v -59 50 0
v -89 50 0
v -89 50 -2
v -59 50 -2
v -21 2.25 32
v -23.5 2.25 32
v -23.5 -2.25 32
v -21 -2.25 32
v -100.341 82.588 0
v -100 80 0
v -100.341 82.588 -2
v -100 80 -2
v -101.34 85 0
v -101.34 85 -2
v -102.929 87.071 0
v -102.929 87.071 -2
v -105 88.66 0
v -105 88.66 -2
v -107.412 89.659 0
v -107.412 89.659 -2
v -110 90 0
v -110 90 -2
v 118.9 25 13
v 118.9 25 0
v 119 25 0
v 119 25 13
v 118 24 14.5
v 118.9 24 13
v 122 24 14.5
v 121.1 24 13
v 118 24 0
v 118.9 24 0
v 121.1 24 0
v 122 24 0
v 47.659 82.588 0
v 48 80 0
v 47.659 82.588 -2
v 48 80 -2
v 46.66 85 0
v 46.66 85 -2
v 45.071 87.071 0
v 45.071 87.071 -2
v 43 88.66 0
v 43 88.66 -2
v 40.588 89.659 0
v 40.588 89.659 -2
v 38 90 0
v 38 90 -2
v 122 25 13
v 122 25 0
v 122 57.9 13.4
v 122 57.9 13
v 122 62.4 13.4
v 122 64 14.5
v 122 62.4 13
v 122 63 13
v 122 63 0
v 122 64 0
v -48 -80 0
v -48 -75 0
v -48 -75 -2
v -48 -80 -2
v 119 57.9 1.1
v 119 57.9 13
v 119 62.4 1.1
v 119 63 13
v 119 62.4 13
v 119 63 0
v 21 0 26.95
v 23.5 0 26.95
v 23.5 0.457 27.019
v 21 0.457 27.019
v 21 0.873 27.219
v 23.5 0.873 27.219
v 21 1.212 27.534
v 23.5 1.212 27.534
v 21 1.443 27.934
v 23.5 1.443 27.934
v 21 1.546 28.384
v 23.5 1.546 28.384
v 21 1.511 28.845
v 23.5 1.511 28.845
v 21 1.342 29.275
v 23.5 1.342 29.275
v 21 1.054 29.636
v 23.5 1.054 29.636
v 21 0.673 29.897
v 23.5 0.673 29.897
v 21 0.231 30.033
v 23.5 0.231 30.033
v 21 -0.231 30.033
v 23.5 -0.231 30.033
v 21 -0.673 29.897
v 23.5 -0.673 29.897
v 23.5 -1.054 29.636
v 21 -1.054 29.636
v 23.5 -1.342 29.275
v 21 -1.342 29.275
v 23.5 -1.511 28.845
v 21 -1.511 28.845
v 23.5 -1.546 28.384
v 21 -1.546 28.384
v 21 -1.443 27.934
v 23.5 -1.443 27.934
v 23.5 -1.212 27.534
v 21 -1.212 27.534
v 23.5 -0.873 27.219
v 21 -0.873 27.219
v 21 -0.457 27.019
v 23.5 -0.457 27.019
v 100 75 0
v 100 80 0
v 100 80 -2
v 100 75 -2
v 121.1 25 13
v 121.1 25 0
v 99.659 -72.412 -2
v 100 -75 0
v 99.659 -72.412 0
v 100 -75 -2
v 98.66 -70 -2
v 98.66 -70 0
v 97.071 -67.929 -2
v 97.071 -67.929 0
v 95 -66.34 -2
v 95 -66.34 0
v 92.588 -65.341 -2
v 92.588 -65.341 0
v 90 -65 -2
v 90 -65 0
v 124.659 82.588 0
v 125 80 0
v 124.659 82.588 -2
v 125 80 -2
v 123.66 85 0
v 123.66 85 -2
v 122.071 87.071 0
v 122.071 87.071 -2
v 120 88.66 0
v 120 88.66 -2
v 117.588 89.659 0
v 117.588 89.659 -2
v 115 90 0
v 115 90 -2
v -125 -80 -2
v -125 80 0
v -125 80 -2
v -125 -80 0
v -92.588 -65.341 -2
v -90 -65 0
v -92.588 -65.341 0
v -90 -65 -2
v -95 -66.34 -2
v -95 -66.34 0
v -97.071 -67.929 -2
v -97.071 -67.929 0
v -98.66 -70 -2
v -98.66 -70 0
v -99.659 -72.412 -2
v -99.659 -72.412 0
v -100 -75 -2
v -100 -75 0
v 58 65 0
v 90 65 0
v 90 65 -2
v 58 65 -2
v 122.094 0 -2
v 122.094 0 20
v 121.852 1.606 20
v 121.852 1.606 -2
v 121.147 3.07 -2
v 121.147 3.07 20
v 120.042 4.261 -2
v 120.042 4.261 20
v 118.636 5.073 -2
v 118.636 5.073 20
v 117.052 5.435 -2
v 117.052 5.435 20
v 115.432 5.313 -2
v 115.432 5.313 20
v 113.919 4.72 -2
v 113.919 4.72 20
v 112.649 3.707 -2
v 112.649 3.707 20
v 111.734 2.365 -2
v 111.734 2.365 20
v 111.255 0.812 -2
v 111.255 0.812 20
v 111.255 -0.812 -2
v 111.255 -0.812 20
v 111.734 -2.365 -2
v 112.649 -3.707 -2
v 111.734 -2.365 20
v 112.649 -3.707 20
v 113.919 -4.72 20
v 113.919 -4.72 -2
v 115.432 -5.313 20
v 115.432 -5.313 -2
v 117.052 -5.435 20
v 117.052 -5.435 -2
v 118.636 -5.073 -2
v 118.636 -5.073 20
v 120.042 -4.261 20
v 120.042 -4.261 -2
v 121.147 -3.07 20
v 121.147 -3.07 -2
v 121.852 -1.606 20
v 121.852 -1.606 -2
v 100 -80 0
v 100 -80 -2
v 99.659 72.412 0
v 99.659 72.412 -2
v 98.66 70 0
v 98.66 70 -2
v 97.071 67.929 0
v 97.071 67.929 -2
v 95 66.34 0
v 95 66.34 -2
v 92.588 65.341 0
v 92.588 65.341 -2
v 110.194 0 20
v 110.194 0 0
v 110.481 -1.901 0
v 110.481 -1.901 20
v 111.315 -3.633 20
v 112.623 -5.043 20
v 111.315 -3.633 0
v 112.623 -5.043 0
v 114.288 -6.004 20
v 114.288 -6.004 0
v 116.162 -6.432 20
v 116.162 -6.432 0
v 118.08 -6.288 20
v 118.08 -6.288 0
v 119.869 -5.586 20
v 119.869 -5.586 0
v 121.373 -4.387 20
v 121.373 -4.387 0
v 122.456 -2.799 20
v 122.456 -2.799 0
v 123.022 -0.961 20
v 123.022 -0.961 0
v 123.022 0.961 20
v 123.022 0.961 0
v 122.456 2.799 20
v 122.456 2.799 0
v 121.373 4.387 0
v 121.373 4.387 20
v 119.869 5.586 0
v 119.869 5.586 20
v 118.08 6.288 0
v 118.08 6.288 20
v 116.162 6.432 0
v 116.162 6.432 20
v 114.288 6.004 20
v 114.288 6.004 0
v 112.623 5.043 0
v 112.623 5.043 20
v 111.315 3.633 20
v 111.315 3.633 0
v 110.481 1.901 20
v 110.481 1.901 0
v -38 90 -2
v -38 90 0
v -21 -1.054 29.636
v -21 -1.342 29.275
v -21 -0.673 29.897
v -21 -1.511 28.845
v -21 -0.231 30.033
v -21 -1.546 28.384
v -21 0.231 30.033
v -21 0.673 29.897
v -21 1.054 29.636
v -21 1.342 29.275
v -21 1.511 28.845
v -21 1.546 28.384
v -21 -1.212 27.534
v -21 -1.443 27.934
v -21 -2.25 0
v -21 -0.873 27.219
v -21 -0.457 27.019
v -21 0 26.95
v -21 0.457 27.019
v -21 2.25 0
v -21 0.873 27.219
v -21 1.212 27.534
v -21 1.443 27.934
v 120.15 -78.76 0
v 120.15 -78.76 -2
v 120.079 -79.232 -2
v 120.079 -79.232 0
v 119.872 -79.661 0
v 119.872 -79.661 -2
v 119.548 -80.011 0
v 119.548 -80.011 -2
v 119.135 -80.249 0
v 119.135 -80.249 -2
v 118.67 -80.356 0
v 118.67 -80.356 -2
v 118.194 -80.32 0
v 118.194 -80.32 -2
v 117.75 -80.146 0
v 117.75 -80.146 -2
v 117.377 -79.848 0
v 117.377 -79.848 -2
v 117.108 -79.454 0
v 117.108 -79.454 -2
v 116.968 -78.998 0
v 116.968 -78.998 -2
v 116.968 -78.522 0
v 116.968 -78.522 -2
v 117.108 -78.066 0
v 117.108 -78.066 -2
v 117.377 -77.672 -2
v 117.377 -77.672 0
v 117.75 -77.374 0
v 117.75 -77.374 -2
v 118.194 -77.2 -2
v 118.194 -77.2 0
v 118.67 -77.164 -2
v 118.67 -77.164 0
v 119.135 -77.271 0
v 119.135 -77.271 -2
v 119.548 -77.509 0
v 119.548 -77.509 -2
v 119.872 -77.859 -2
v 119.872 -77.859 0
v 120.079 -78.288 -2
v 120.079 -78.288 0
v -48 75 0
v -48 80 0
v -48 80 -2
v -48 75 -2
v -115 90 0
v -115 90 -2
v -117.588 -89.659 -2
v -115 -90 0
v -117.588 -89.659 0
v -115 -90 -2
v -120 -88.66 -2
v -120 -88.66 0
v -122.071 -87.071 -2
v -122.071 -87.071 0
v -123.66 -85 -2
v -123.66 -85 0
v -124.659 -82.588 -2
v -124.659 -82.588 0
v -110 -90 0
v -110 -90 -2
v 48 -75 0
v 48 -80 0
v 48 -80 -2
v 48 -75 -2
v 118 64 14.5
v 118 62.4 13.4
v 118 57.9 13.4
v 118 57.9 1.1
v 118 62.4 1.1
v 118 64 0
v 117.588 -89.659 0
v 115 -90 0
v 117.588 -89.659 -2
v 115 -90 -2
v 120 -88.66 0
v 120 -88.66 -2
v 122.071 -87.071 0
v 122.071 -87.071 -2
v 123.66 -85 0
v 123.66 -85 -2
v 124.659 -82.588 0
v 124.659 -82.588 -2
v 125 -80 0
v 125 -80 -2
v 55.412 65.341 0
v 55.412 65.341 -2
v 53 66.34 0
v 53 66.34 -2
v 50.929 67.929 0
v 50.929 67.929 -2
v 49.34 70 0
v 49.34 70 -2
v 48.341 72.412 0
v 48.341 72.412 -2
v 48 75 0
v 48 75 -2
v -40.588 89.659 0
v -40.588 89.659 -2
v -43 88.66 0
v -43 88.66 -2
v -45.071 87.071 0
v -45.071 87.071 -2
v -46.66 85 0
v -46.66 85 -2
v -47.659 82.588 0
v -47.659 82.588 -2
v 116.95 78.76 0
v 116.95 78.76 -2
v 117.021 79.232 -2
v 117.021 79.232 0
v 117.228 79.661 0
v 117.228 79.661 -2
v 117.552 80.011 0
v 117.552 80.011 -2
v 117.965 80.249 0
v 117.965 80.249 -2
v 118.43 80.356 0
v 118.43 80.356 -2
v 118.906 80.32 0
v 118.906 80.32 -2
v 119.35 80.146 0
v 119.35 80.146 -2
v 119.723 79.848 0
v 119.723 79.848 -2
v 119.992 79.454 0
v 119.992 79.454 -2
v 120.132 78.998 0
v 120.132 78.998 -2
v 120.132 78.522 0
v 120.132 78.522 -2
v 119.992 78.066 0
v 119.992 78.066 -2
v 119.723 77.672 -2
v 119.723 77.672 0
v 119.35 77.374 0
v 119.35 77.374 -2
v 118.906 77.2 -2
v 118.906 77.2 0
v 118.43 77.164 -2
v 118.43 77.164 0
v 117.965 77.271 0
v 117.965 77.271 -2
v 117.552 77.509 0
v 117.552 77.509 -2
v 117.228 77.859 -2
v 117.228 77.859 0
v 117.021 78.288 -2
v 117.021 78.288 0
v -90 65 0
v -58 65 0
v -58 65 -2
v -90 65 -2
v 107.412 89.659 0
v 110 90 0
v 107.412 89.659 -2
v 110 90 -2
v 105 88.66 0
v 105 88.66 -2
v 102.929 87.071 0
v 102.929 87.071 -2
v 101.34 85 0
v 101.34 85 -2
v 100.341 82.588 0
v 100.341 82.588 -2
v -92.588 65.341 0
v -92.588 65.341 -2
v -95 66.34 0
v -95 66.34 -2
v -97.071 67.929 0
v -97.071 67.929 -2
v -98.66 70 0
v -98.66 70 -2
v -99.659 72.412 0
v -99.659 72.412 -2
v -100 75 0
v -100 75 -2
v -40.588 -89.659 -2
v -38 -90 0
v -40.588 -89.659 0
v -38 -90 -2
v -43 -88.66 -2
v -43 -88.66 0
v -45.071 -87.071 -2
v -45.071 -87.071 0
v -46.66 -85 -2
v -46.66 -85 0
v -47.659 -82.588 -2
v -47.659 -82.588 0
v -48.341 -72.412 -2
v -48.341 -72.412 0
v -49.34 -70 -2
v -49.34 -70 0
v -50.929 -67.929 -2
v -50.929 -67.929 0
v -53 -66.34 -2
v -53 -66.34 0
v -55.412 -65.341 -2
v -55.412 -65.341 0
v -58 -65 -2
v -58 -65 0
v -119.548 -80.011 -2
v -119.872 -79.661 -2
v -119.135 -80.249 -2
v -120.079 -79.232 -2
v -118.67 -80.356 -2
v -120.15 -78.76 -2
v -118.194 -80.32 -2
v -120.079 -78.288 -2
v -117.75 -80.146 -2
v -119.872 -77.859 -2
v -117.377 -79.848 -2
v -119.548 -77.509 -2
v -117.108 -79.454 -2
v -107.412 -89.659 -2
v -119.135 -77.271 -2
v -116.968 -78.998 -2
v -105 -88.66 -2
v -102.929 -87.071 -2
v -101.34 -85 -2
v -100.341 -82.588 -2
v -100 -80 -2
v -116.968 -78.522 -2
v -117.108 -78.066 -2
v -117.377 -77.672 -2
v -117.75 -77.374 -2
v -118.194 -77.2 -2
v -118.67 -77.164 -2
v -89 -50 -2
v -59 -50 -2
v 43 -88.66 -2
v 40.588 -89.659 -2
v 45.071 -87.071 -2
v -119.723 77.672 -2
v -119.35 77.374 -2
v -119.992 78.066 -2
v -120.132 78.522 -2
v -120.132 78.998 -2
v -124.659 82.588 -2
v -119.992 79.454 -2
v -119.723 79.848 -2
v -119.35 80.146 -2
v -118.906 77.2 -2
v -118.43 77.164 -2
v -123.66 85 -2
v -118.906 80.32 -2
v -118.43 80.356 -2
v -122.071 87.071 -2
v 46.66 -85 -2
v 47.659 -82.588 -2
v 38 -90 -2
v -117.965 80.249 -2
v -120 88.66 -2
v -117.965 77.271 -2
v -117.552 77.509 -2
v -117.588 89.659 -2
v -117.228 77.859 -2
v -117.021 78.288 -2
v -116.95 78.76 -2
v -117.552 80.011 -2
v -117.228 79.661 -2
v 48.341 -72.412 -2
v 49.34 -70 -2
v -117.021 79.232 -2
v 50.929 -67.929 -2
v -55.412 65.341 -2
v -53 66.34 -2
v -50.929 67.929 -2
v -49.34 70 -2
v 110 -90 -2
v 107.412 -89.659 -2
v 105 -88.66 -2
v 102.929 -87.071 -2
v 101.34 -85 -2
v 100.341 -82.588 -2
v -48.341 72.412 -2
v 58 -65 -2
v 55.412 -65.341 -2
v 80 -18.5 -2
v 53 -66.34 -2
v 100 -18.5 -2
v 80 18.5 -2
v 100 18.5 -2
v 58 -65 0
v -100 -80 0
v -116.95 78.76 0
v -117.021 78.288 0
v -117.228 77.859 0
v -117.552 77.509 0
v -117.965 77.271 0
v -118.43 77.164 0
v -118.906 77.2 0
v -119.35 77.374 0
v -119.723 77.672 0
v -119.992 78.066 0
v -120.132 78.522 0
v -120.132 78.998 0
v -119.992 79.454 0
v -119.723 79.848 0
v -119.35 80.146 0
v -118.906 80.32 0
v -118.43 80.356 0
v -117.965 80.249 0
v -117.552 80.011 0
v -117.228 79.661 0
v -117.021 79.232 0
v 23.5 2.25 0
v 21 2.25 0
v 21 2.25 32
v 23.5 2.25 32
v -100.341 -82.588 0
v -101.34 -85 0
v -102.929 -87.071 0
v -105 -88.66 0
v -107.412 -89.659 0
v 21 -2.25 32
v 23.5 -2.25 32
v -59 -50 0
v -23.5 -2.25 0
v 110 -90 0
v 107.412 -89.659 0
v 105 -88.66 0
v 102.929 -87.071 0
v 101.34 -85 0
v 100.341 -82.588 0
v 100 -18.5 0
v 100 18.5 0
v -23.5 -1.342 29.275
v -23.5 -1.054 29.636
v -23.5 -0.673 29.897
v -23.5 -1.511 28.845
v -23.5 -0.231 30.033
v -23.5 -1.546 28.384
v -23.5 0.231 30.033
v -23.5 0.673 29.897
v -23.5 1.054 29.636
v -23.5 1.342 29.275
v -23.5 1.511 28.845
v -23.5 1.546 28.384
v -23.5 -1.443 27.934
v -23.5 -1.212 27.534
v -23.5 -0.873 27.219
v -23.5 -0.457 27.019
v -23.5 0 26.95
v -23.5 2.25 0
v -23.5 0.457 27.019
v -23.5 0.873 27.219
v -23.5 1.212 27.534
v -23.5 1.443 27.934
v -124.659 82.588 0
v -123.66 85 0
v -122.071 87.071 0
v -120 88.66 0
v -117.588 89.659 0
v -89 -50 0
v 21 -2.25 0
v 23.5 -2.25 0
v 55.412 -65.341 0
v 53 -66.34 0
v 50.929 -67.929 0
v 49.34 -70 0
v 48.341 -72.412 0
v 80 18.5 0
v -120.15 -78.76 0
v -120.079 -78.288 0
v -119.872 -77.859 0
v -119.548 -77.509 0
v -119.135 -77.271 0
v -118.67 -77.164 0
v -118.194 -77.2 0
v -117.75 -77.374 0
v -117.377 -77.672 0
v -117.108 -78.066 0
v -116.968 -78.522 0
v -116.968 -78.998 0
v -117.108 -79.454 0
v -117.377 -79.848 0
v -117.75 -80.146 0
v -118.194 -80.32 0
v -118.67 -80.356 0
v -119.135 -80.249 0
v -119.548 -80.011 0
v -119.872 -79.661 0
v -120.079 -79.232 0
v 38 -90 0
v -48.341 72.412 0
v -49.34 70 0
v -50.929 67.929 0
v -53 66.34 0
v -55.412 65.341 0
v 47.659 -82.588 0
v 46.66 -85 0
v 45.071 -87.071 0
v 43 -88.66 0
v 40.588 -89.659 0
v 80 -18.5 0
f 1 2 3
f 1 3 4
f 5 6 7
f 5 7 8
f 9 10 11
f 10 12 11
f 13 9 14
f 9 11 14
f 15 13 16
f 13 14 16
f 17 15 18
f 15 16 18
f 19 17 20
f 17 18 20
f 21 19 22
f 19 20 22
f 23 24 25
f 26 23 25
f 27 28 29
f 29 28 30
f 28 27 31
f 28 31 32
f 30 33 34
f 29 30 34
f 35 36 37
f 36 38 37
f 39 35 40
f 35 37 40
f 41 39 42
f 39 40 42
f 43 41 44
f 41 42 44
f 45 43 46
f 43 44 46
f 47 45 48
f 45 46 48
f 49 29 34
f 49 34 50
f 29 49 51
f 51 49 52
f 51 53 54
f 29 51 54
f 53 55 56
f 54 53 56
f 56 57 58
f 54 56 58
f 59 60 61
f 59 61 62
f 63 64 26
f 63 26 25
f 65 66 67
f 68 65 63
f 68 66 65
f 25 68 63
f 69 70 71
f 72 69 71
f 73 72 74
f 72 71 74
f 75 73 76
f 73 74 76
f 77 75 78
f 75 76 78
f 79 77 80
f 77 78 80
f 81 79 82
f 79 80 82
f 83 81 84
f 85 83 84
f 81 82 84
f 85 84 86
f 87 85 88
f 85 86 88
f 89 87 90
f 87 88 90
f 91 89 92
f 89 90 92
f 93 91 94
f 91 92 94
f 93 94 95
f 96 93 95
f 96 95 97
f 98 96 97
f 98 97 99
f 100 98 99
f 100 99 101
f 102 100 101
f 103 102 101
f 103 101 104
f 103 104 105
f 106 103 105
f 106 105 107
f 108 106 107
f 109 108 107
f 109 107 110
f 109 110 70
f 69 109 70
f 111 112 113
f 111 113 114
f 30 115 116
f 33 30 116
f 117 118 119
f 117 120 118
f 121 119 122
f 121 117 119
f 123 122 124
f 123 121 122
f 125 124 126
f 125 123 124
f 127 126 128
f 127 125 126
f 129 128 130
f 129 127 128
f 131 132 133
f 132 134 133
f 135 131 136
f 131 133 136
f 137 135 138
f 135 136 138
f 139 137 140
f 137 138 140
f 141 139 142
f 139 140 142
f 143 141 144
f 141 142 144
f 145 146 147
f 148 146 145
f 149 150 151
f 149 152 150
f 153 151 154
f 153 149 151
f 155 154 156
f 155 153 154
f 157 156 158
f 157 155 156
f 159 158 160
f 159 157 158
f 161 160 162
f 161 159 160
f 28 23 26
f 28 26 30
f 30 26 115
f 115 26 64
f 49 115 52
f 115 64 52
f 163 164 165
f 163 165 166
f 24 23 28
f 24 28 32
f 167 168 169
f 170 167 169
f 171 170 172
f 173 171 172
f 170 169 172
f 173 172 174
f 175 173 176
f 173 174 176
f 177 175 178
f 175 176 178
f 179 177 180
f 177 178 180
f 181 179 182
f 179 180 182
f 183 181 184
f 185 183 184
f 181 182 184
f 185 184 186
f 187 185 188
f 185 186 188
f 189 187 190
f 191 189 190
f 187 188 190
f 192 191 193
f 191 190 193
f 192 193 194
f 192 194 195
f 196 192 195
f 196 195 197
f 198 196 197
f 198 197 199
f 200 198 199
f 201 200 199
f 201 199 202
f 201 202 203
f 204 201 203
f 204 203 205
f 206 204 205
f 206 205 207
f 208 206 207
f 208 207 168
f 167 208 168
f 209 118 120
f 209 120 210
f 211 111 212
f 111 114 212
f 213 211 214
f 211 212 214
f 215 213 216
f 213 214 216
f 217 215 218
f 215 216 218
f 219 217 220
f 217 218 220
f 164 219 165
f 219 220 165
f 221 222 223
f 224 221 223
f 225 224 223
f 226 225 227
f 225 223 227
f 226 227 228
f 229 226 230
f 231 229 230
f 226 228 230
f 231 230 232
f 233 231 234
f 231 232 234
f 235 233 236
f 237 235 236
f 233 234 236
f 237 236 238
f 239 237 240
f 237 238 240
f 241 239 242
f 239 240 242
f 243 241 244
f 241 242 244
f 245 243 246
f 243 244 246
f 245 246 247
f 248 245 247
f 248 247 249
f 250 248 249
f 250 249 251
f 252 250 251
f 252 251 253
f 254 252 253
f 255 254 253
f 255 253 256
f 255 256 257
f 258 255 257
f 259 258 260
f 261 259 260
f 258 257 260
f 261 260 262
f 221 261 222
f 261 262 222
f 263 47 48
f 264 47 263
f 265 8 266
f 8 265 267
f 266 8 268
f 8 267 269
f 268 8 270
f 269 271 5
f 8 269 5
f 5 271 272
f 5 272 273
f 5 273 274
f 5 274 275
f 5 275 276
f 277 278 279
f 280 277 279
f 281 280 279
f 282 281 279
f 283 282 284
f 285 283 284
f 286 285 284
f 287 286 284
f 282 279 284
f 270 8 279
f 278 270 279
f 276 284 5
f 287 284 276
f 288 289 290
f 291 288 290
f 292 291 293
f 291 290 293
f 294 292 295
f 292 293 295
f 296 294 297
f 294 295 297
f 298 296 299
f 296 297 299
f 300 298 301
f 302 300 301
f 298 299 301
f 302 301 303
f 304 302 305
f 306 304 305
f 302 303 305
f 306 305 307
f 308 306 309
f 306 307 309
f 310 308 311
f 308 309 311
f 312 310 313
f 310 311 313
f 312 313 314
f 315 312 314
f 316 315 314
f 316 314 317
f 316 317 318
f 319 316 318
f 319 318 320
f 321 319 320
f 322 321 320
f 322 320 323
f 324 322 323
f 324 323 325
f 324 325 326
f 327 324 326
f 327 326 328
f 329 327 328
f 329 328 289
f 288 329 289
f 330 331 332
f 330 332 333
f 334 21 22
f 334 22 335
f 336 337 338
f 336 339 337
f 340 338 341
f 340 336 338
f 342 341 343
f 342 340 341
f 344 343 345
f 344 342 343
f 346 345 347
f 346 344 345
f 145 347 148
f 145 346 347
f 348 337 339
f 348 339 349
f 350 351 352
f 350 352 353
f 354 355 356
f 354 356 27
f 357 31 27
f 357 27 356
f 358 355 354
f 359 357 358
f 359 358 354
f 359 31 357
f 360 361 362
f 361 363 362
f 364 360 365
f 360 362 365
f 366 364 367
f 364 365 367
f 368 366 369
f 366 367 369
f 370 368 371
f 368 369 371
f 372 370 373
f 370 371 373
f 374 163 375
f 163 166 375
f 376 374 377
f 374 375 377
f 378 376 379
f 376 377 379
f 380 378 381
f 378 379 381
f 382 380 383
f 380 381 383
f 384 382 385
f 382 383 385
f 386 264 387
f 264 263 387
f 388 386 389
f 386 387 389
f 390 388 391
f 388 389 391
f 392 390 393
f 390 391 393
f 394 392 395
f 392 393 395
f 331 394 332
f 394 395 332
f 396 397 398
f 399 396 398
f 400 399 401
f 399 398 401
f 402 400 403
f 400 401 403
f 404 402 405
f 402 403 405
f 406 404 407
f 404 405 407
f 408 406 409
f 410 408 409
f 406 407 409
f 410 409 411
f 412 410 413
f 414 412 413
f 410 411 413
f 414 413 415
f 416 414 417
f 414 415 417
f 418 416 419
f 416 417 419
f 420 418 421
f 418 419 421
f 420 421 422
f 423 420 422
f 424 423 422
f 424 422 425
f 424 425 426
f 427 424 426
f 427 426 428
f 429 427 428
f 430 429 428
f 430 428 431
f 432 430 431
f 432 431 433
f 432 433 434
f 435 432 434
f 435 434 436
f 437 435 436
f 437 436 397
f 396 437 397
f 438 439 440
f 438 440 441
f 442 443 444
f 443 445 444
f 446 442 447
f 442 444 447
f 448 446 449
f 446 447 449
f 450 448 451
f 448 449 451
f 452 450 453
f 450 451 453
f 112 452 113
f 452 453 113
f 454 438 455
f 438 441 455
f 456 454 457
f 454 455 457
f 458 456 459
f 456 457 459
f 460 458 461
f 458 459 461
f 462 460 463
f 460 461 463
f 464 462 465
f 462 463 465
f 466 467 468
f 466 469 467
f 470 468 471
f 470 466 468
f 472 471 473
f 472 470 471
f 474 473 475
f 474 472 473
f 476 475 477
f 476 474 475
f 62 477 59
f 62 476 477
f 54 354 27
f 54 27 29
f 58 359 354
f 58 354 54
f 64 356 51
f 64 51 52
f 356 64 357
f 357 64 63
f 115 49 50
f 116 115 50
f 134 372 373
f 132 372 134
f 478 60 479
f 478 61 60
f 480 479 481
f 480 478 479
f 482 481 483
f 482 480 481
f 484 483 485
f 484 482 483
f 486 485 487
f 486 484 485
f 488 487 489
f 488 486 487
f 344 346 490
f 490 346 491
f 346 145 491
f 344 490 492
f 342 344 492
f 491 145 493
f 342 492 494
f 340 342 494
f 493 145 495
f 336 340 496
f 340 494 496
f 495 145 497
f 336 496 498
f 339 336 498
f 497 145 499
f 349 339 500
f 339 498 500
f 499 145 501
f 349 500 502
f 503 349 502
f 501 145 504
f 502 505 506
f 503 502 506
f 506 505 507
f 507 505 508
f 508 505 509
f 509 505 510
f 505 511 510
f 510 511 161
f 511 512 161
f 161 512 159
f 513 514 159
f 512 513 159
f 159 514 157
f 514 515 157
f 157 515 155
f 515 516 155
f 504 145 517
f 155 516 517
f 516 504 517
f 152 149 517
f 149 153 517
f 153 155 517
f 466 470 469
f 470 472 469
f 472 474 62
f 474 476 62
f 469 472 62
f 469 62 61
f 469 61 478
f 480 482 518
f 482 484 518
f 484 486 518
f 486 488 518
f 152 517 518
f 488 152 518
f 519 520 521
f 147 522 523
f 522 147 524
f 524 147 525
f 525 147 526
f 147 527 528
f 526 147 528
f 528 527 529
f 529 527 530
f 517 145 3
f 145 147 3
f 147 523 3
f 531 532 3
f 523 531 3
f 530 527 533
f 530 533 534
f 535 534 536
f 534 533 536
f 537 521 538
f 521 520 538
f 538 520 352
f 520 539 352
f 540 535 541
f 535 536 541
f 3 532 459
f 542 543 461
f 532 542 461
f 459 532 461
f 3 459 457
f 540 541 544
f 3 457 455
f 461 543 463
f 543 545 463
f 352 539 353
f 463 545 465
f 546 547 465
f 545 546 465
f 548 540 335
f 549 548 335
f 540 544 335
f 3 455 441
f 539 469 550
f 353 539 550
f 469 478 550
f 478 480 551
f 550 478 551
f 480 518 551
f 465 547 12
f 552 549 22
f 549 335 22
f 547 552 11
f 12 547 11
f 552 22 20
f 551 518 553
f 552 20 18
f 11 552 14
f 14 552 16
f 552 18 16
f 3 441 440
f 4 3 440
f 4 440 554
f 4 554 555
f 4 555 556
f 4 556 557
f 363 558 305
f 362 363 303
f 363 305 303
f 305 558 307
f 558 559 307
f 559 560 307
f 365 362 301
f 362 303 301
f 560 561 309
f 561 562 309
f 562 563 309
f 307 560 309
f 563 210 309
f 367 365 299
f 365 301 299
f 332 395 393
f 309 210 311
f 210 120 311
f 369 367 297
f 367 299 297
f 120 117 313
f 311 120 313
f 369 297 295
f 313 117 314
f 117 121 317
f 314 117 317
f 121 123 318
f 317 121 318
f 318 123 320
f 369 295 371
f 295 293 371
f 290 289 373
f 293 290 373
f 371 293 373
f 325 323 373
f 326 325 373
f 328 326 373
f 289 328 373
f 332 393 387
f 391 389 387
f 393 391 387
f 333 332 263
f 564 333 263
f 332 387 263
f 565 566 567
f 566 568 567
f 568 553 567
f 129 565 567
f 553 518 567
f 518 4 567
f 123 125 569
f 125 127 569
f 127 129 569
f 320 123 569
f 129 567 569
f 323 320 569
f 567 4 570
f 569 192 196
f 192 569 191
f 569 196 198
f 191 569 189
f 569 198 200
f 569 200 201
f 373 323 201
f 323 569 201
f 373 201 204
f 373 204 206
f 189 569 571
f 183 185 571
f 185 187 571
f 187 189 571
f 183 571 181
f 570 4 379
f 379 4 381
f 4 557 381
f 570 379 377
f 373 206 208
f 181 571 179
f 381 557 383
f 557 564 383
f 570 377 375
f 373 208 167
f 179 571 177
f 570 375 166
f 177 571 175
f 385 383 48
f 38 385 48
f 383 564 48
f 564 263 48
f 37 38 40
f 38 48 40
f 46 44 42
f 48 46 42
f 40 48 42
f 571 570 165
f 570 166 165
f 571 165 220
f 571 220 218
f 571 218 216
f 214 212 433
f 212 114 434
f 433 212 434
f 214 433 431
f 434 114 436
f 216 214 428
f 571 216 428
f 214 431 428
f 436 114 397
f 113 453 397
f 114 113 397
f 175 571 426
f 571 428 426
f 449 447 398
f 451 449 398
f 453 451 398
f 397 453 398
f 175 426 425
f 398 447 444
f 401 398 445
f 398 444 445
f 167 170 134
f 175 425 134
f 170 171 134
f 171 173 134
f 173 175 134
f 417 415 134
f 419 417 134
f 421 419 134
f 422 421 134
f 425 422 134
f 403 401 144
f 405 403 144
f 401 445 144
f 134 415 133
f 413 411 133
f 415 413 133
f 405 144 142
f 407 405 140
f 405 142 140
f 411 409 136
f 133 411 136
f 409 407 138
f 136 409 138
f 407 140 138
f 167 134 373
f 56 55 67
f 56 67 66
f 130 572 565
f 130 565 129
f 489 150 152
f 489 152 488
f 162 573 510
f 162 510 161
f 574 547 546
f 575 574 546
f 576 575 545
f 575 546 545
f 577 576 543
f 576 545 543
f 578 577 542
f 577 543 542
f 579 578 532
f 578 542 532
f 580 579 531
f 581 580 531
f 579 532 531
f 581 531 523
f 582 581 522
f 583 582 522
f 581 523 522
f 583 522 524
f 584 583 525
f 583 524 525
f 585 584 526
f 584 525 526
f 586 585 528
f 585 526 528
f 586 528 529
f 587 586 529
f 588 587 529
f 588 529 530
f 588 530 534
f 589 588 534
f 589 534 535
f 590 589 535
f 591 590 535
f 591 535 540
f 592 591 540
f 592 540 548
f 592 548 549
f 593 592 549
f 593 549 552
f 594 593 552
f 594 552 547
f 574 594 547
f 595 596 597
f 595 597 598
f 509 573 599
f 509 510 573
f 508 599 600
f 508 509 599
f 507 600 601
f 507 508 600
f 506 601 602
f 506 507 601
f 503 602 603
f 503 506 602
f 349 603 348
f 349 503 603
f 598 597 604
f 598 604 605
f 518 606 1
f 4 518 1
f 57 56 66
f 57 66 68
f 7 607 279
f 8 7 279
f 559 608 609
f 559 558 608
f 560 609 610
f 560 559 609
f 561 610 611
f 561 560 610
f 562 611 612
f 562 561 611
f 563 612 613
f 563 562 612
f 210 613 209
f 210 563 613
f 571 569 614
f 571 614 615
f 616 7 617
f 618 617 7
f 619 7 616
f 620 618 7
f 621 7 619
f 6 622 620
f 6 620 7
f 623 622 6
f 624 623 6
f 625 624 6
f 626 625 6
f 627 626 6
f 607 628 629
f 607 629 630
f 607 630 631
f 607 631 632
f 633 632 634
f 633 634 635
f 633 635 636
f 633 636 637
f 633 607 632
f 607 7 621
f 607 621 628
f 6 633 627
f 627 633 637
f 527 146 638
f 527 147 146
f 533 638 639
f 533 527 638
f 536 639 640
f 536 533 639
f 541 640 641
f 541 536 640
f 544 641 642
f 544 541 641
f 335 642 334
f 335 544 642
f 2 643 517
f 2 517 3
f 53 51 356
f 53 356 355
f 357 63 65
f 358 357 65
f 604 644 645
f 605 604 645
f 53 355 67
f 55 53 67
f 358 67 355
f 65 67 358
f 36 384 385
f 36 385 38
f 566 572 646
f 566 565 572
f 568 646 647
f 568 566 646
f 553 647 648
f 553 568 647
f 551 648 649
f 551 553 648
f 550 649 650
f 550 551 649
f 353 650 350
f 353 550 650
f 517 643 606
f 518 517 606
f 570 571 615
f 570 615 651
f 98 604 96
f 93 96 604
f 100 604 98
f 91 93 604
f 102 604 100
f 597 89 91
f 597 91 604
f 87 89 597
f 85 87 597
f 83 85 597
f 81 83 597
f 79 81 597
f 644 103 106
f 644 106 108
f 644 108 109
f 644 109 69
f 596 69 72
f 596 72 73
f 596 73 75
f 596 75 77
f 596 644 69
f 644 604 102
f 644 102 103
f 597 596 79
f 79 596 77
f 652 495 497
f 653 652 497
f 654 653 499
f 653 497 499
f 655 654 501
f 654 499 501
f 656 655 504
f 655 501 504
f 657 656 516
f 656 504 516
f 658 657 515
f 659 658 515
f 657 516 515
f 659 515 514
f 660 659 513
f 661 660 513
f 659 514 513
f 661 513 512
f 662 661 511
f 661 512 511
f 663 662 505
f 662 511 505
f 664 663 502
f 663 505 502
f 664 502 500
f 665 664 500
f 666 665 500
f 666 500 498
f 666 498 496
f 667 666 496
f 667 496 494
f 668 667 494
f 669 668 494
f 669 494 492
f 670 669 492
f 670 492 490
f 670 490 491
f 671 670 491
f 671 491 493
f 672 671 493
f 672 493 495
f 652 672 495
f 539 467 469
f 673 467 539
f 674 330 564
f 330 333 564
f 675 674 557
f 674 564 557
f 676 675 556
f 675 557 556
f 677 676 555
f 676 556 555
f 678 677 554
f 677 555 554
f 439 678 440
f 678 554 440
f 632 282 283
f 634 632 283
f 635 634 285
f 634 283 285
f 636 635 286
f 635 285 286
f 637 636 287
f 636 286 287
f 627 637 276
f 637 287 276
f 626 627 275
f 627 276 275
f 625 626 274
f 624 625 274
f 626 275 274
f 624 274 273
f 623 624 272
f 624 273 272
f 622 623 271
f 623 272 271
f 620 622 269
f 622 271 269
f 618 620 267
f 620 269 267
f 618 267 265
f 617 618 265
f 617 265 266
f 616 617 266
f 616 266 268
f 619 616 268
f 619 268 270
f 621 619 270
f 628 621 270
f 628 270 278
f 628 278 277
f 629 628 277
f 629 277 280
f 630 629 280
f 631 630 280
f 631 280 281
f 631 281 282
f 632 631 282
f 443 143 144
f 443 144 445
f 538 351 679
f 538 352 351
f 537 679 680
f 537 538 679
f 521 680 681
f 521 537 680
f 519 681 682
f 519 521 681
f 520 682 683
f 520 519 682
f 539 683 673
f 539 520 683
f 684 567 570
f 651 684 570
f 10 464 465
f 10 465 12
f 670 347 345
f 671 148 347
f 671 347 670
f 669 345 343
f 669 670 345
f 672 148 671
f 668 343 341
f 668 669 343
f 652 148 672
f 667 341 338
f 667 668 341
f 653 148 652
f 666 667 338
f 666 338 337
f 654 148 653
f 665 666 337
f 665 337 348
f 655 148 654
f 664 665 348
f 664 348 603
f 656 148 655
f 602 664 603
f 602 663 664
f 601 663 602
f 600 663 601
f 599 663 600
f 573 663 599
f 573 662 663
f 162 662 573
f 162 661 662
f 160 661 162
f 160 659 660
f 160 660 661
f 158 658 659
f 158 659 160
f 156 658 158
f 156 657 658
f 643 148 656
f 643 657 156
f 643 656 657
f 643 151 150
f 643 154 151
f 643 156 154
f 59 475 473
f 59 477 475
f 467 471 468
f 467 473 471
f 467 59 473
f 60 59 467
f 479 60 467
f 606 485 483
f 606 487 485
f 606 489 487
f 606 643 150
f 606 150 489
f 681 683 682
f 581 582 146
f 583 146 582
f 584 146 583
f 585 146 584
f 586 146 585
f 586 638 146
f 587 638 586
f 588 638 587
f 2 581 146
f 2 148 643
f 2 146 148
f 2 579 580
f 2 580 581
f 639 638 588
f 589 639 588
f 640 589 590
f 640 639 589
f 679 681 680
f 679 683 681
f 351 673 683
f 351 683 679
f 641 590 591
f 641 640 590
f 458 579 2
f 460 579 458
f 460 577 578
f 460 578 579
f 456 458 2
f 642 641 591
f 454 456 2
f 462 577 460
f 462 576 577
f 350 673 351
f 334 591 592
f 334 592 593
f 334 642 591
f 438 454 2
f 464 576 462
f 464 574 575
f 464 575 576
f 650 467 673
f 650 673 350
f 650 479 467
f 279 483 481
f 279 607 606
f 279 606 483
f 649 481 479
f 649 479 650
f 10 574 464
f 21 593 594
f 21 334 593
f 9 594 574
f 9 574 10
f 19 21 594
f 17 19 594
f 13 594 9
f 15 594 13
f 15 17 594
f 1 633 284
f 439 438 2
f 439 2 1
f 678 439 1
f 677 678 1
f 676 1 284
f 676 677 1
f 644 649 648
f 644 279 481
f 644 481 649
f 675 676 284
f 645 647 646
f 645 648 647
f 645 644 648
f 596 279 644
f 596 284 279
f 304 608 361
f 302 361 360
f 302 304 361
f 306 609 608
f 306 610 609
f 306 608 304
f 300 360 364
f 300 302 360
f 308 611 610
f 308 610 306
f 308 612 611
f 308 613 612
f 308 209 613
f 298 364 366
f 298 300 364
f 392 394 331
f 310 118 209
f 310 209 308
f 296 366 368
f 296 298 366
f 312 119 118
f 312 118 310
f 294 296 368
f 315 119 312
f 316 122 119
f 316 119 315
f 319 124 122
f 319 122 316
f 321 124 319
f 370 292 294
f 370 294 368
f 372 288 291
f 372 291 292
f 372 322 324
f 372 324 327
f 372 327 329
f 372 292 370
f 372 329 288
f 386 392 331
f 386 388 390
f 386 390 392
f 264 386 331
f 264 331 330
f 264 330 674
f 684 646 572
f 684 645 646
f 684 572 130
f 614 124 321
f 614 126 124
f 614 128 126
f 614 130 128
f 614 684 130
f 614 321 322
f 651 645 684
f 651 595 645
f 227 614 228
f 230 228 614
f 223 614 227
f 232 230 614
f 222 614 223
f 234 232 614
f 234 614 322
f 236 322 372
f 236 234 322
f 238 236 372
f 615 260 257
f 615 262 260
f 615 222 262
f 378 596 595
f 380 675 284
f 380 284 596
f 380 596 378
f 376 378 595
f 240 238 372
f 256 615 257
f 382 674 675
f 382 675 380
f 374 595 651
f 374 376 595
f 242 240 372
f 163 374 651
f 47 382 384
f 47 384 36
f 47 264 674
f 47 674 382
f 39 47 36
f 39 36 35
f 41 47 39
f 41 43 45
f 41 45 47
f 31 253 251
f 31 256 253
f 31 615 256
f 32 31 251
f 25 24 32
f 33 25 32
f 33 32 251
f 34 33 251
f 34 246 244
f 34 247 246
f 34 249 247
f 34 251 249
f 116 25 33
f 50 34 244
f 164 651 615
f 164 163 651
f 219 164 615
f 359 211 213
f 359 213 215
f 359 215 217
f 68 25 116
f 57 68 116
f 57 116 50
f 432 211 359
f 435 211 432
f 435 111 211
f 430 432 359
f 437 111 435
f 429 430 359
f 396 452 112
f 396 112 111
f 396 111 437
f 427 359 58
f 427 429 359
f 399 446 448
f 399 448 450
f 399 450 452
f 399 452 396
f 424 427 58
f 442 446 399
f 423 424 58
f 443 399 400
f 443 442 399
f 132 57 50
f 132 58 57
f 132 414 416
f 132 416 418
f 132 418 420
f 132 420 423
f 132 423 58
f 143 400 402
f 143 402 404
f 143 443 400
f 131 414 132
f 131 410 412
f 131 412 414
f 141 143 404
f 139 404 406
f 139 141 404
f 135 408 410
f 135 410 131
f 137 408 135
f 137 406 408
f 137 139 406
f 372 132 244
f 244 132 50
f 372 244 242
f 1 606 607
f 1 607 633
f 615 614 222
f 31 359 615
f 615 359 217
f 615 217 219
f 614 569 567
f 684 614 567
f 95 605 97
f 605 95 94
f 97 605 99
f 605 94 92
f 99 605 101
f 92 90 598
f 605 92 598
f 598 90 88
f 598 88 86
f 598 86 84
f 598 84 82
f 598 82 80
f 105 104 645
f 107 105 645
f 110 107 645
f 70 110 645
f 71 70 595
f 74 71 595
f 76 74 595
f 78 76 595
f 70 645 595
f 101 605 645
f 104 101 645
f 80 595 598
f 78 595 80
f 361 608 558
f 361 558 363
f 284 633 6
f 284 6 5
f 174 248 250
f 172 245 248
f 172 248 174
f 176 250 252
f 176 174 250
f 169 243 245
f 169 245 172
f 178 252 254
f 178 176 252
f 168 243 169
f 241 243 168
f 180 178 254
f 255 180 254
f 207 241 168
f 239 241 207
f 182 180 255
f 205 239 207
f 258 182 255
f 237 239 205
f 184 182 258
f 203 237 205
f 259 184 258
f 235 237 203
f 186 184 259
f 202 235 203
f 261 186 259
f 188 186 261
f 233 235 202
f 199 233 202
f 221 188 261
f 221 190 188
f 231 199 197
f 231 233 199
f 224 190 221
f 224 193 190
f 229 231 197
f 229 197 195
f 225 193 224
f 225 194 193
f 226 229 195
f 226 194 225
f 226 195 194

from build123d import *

# Parameters (mm, degrees)
BOSS_EXTRU_1_DEPTH       = 2
ESQUISSE2_R              = 1.6
ENL_V_MAT_EXTRU_1_DEPTH  = 155.04220201
CONG_1_R                 = 10
ESQUISSE5_W              = 20
ESQUISSE5_H              = 37
ENL_V_MAT_EXTRU_4_DEPTH  = 10
ESQUISSE6_W              = 4
ESQUISSE6_H              = 40
BOSS_EXTRU_3_DEPTH       = 14.5
ESQUISSE10_W             = 12.3
ESQUISSE10_H             = 4.5
ENL_V_MAT_EXTRU_5_DEPTH  = 12.1
ESQUISSE9_W              = 13
ESQUISSE9_H              = 38
ENL_V_MAT_EXTRU_6_DEPTH  = 3
ESQUISSE11_W             = 2.2
ESQUISSE11_H             = 13
ENL_V_MAT_EXTRU_7_DEPTH  = 3
ESQUISSE14_R             = 6.45
BOSS_EXTRU_4_DEPTH       = 20
ESQUISSE15_R             = 5.45
ENL_V_MAT_EXTRU_8_DEPTH  = 156.592416268
ESQUISSE17_W             = 30
ESQUISSE17_H             = 100
ENL_V_MAT_EXTRU_10_DEPTH = 156.32224567
ESQUISSE18_W             = 2.5
ESQUISSE18_H             = 4.5
BOSS_EXTRU_5_DEPTH       = 32
ESQUISSE19_R             = 1.55
ENL_V_MAT_EXTRU_11_DEPTH = 177.567975579


with BuildPart() as part:
    # Esquisse1 → Boss.-Extru.1 (new body)
    with BuildSketch(Plane.XY):
        Polygon((100, -90), (125, -90), (125, 90), (100, 90), (100, 65), (48, 65), (48, 90), (-48, 90), (-48, 65), (-100, 65), (-100, 90), (-125, 90), (-125, -90), (-100, -90), (-100, -65), (-48, -65), (-48, -90), (48, -90), (48, -65), (100, -65), align=None)
    extrude(amount=-BOSS_EXTRU_1_DEPTH)

    # Esquisse2 → Enlèv. mat.-Extru.1 (cut, through all)
    with BuildSketch(Plane(origin=(0, 0, -2), x_dir=(-1, 0, 0), z_dir=(0, 0, -1))):
        with Locations((-118.55, 78.76)):
            Circle(ESQUISSE2_R)
        with Locations(Location((118.55, 78.76, 0), (0, 0, 180))):
            Circle(ESQUISSE2_R)
        with Locations((118.55, -78.76)):
            Circle(ESQUISSE2_R)
        with Locations(Location((-118.55, -78.76, 0), (0, 0, 180))):
            Circle(ESQUISSE2_R)
    extrude(amount=-ENL_V_MAT_EXTRU_1_DEPTH, mode=Mode.SUBTRACT)

    # Congé1
    cong_1_edges = [part.edges().sort_by_distance(p)[0] for p in [
        (-100, 90, -1),
        (-48, 90, -1),
        (-48, 65, -1),
        (-100, 65, -1),
        (100, 65, -1),
        (48, 65, -1),
        (48, 90, -1),
        (100, 90, -1),
        (48, -90, -1),
        (48, -65, -1),
        (100, -65, -1),
        (100, -90, -1),
        (-100, -65, -1),
        (-48, -65, -1),
        (-48, -90, -1),
        (-100, -90, -1),
        (125, 90, -1),
        (125, -90, -1),
        (-125, -90, -1),
        (-125, 90, -1),
    ]]
    fillet(cong_1_edges, radius=CONG_1_R)

    # Esquisse5 → Enlèv. mat.-Extru.4 (cut)
    with BuildSketch(Plane(origin=(0, 0, -2), x_dir=(-1, 0, 0), z_dir=(0, 0, -1))):
        with Locations((-90, 0)):
            Rectangle(ESQUISSE5_W, ESQUISSE5_H)
    extrude(amount=-ENL_V_MAT_EXTRU_4_DEPTH, mode=Mode.SUBTRACT)

    # Esquisse6 → Boss.-Extru.3 (add)
    with BuildSketch(Plane.XY):
        with Locations((120, 44)):
            Rectangle(ESQUISSE6_W, ESQUISSE6_H)
    extrude(amount=BOSS_EXTRU_3_DEPTH)

    # Esquisse10 → Enlèv. mat.-Extru.5 (cut)
    with BuildSketch(Plane(origin=(122, 0, 0), x_dir=(0, 0, -1), z_dir=(1, 0, 0))):
        with Locations((-7.25, 60.15)):
            Rectangle(ESQUISSE10_W, ESQUISSE10_H)
    extrude(amount=-ENL_V_MAT_EXTRU_5_DEPTH, mode=Mode.SUBTRACT)

    # Esquisse9 → Enlèv. mat.-Extru.6 (cut)
    with BuildSketch(Plane(origin=(122, 0, 0), x_dir=(0, 0, -1), z_dir=(1, 0, 0))):
        with Locations((-6.5, 44)):
            Rectangle(ESQUISSE9_W, ESQUISSE9_H)
    extrude(amount=-ENL_V_MAT_EXTRU_6_DEPTH, mode=Mode.SUBTRACT)

    # Esquisse11 → Enlèv. mat.-Extru.7 (cut)
    with BuildSketch(Plane(origin=(0, 25, 0), x_dir=(1, 0, 0), z_dir=(0, 1, 0))):
        with Locations((120, -6.5)):
            Rectangle(ESQUISSE11_W, ESQUISSE11_H)
    extrude(amount=-ENL_V_MAT_EXTRU_7_DEPTH, mode=Mode.SUBTRACT)

    # Esquisse14 → Boss.-Extru.4 (add)
    with BuildSketch(Plane.XY):
        with Locations(Location((116.644469063, 0, 0), (0, 0, 180))):
            Circle(ESQUISSE14_R)
    extrude(amount=BOSS_EXTRU_4_DEPTH)

    # Esquisse15 → Enlèv. mat.-Extru.8 (cut, through all)
    with BuildSketch(Plane.XY.offset(20)):
        with Locations((116.644469063, 0)):
            Circle(ESQUISSE15_R)
    extrude(amount=-ENL_V_MAT_EXTRU_8_DEPTH, mode=Mode.SUBTRACT)

    # Esquisse17 → Enlèv. mat.-Extru.10 (cut, through all)
    with BuildSketch(Plane.XY):
        with Locations((-74, 0)):
            Rectangle(ESQUISSE17_W, ESQUISSE17_H)
    extrude(amount=-ENL_V_MAT_EXTRU_10_DEPTH, mode=Mode.SUBTRACT)

    # Esquisse18 → Boss.-Extru.5 (add)
    with BuildSketch(Plane.XY):
        with Locations((-22.25, 0)):
            Rectangle(ESQUISSE18_W, ESQUISSE18_H)
        with Locations((22.25, 0)):
            Rectangle(ESQUISSE18_W, ESQUISSE18_H)
    extrude(amount=BOSS_EXTRU_5_DEPTH)

    # Esquisse19 → Enlèv. mat.-Extru.11 (cut, through all)
    with BuildSketch(Plane(origin=(23.5, 0, 0), x_dir=(0, 0, -1), z_dir=(1, 0, 0))):
        with Locations((-28.5, 0)):
            Circle(ESQUISSE19_R)
    extrude(amount=-ENL_V_MAT_EXTRU_11_DEPTH, mode=Mode.SUBTRACT)


solid = part.part
